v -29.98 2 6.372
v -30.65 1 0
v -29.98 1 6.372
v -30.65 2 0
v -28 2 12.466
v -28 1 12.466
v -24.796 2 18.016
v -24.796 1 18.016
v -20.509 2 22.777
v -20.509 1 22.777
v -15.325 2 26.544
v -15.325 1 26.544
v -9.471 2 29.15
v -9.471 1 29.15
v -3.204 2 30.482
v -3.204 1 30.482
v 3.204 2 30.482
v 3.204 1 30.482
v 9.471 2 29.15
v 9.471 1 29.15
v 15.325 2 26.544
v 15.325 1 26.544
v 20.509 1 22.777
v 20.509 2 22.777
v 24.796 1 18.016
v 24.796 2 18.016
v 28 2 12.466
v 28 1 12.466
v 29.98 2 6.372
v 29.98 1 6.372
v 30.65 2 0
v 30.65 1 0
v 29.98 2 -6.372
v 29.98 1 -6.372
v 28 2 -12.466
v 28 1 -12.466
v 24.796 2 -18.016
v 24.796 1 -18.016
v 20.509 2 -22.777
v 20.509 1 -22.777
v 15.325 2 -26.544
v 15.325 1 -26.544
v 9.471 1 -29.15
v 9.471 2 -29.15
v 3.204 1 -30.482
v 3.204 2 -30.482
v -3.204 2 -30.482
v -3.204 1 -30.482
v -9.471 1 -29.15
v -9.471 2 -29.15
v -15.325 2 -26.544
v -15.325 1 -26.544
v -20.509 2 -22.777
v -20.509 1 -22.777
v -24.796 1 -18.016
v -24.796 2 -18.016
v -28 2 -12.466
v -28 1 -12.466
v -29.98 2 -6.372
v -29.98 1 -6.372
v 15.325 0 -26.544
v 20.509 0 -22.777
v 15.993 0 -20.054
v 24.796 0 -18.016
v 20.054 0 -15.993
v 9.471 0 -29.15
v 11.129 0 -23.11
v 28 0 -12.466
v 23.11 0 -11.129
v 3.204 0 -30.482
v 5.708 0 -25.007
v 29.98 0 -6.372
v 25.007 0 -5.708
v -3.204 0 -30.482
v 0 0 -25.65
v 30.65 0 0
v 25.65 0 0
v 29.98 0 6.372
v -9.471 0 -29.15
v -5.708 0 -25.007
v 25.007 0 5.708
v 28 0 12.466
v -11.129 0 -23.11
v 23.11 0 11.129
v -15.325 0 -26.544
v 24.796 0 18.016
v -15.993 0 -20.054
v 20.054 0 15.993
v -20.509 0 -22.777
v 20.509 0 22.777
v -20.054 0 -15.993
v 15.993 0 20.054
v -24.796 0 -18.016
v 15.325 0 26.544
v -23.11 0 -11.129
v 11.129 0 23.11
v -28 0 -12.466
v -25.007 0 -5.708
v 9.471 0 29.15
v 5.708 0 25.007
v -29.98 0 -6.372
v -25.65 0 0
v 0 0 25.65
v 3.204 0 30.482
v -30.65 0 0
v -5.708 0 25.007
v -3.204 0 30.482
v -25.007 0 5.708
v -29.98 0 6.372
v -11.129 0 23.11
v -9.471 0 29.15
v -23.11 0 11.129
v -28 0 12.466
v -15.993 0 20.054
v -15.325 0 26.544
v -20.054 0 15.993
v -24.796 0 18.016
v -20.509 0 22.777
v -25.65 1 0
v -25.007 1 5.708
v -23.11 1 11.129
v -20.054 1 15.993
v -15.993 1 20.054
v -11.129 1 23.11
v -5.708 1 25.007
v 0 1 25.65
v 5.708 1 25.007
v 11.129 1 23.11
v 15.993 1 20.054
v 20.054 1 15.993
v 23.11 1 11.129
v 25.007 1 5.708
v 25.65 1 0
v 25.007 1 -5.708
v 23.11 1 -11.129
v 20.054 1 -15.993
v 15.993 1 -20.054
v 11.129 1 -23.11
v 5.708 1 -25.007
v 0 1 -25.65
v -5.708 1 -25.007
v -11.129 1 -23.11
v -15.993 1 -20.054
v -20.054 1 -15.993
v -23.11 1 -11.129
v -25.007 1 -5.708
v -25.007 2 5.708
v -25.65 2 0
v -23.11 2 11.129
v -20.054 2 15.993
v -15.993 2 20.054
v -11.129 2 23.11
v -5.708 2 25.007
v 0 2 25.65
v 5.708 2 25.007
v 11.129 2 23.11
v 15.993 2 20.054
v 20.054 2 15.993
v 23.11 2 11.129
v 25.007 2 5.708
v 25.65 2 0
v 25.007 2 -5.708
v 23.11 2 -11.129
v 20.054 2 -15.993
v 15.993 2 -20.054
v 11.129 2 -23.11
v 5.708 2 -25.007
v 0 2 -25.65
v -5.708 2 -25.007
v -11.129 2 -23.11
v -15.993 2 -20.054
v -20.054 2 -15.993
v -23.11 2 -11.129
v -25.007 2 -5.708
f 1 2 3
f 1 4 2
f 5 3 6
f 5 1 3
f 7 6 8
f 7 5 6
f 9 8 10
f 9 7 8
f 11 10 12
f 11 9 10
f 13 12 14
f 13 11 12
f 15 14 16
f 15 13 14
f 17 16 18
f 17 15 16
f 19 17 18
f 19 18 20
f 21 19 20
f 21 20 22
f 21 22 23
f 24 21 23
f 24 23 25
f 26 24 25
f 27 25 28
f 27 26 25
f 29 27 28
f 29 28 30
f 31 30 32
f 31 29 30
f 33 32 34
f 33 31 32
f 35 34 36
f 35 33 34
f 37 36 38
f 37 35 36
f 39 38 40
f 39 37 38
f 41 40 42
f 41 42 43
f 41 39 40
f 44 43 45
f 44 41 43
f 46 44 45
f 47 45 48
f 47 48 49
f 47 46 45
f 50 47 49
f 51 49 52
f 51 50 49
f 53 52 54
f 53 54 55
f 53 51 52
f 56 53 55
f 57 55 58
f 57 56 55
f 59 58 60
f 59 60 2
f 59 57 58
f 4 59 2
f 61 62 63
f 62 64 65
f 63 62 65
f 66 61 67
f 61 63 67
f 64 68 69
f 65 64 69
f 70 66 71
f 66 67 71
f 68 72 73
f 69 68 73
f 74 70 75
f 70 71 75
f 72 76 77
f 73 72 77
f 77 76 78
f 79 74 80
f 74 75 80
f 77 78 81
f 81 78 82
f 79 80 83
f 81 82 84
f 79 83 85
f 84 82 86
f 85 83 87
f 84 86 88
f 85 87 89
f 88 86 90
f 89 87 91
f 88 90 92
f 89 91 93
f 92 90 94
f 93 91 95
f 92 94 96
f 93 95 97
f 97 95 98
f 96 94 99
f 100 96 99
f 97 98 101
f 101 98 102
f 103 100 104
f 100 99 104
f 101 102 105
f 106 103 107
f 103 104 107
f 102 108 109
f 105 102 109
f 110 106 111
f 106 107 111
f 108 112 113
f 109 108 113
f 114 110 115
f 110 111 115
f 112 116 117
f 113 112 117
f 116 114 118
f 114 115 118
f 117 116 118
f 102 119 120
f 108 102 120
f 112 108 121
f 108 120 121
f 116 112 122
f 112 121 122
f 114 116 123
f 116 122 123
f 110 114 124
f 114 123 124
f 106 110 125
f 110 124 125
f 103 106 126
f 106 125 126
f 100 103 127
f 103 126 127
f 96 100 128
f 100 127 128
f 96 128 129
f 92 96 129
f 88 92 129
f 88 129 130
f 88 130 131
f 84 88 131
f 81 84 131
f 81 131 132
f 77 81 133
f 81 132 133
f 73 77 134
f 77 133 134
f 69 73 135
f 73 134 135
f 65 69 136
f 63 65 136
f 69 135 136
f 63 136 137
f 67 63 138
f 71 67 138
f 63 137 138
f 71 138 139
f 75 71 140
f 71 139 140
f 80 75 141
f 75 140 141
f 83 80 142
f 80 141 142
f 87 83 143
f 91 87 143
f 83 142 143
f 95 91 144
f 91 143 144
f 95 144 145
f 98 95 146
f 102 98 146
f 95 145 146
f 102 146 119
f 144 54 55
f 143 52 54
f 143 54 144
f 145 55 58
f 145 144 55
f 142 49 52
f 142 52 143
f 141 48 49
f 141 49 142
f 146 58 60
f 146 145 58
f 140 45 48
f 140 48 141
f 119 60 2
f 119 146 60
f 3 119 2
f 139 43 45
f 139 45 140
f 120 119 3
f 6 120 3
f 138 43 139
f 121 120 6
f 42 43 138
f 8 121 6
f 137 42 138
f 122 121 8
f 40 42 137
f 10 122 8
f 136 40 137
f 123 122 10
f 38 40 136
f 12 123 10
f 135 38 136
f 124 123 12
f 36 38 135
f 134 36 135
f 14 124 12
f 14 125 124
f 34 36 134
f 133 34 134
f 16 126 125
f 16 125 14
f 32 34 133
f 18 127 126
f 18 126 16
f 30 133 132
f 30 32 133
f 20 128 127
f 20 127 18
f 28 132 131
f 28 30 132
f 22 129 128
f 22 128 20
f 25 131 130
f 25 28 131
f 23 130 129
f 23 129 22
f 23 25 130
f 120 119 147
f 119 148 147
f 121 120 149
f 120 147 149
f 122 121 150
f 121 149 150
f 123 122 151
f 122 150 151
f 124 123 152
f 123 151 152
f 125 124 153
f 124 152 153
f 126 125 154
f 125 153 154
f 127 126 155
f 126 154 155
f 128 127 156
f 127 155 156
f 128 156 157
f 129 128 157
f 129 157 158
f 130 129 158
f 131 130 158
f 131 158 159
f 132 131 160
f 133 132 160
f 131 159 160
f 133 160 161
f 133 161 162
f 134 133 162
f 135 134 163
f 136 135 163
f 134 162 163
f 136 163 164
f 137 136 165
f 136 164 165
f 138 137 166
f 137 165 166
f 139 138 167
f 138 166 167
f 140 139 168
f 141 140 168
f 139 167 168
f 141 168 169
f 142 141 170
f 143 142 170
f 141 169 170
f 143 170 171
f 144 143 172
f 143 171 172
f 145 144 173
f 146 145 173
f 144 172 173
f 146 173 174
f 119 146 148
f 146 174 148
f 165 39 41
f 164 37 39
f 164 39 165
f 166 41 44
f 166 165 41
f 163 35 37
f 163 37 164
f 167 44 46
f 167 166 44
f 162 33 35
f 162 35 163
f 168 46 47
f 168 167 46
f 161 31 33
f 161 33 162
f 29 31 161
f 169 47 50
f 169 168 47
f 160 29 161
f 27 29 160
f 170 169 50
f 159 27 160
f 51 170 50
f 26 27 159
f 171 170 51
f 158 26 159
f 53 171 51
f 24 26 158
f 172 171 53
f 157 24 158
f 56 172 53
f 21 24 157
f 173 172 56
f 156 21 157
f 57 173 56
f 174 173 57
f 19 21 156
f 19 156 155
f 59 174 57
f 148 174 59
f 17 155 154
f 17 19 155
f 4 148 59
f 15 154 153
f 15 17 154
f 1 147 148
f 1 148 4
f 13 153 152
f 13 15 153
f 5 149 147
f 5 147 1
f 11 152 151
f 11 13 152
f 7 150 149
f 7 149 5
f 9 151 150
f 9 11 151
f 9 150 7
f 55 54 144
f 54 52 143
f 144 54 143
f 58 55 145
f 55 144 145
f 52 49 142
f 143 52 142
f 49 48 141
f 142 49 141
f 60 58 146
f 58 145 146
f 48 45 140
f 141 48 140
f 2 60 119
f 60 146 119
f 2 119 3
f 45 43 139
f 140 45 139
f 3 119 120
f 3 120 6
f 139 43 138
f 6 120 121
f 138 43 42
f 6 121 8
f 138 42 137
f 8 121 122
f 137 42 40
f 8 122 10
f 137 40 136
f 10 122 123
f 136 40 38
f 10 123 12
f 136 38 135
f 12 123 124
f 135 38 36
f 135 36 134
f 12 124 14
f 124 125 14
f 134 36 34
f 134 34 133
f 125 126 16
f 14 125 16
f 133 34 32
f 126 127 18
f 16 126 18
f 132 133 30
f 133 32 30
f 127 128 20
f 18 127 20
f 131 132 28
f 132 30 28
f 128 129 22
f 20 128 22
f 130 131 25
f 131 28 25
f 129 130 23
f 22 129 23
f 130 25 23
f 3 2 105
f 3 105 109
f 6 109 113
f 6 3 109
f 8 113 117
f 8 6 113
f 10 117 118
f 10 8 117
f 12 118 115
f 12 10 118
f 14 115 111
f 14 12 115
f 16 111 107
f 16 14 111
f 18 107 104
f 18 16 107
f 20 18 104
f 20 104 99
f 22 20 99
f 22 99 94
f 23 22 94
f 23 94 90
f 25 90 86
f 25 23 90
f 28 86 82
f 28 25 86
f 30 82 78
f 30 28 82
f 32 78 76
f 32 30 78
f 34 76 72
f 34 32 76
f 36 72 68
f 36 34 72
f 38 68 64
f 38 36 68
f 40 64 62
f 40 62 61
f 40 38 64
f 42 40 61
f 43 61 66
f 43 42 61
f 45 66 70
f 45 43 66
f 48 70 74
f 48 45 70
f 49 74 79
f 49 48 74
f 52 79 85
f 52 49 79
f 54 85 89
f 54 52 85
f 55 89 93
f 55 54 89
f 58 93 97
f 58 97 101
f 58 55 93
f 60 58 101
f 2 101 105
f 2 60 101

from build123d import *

# Parameters (mm, degrees)
SKETCH1_W = 5
SKETCH1_H = 2


with BuildPart() as part:
    # Sketch1 → Revolve1 (revolve)
    with BuildSketch(Plane.XY):
        with Locations((-28.15, 1)):
            Rectangle(SKETCH1_W, SKETCH1_H)
    revolve(axis=Axis((0, 0, 0), (0, 1, 0)))


with BuildPart() as body_2:
    # Split1: the piece on the far side of the plane
    add(part.part)
    split(bisect_by=Plane.ZX.offset(1), keep=Keep.BOTTOM)


with BuildPart() as part_1:
    add(part.part)

    # Split1
    split(bisect_by=Plane.ZX.offset(1), keep=Keep.TOP)


solid = Compound([body_2.part, part_1.part])
